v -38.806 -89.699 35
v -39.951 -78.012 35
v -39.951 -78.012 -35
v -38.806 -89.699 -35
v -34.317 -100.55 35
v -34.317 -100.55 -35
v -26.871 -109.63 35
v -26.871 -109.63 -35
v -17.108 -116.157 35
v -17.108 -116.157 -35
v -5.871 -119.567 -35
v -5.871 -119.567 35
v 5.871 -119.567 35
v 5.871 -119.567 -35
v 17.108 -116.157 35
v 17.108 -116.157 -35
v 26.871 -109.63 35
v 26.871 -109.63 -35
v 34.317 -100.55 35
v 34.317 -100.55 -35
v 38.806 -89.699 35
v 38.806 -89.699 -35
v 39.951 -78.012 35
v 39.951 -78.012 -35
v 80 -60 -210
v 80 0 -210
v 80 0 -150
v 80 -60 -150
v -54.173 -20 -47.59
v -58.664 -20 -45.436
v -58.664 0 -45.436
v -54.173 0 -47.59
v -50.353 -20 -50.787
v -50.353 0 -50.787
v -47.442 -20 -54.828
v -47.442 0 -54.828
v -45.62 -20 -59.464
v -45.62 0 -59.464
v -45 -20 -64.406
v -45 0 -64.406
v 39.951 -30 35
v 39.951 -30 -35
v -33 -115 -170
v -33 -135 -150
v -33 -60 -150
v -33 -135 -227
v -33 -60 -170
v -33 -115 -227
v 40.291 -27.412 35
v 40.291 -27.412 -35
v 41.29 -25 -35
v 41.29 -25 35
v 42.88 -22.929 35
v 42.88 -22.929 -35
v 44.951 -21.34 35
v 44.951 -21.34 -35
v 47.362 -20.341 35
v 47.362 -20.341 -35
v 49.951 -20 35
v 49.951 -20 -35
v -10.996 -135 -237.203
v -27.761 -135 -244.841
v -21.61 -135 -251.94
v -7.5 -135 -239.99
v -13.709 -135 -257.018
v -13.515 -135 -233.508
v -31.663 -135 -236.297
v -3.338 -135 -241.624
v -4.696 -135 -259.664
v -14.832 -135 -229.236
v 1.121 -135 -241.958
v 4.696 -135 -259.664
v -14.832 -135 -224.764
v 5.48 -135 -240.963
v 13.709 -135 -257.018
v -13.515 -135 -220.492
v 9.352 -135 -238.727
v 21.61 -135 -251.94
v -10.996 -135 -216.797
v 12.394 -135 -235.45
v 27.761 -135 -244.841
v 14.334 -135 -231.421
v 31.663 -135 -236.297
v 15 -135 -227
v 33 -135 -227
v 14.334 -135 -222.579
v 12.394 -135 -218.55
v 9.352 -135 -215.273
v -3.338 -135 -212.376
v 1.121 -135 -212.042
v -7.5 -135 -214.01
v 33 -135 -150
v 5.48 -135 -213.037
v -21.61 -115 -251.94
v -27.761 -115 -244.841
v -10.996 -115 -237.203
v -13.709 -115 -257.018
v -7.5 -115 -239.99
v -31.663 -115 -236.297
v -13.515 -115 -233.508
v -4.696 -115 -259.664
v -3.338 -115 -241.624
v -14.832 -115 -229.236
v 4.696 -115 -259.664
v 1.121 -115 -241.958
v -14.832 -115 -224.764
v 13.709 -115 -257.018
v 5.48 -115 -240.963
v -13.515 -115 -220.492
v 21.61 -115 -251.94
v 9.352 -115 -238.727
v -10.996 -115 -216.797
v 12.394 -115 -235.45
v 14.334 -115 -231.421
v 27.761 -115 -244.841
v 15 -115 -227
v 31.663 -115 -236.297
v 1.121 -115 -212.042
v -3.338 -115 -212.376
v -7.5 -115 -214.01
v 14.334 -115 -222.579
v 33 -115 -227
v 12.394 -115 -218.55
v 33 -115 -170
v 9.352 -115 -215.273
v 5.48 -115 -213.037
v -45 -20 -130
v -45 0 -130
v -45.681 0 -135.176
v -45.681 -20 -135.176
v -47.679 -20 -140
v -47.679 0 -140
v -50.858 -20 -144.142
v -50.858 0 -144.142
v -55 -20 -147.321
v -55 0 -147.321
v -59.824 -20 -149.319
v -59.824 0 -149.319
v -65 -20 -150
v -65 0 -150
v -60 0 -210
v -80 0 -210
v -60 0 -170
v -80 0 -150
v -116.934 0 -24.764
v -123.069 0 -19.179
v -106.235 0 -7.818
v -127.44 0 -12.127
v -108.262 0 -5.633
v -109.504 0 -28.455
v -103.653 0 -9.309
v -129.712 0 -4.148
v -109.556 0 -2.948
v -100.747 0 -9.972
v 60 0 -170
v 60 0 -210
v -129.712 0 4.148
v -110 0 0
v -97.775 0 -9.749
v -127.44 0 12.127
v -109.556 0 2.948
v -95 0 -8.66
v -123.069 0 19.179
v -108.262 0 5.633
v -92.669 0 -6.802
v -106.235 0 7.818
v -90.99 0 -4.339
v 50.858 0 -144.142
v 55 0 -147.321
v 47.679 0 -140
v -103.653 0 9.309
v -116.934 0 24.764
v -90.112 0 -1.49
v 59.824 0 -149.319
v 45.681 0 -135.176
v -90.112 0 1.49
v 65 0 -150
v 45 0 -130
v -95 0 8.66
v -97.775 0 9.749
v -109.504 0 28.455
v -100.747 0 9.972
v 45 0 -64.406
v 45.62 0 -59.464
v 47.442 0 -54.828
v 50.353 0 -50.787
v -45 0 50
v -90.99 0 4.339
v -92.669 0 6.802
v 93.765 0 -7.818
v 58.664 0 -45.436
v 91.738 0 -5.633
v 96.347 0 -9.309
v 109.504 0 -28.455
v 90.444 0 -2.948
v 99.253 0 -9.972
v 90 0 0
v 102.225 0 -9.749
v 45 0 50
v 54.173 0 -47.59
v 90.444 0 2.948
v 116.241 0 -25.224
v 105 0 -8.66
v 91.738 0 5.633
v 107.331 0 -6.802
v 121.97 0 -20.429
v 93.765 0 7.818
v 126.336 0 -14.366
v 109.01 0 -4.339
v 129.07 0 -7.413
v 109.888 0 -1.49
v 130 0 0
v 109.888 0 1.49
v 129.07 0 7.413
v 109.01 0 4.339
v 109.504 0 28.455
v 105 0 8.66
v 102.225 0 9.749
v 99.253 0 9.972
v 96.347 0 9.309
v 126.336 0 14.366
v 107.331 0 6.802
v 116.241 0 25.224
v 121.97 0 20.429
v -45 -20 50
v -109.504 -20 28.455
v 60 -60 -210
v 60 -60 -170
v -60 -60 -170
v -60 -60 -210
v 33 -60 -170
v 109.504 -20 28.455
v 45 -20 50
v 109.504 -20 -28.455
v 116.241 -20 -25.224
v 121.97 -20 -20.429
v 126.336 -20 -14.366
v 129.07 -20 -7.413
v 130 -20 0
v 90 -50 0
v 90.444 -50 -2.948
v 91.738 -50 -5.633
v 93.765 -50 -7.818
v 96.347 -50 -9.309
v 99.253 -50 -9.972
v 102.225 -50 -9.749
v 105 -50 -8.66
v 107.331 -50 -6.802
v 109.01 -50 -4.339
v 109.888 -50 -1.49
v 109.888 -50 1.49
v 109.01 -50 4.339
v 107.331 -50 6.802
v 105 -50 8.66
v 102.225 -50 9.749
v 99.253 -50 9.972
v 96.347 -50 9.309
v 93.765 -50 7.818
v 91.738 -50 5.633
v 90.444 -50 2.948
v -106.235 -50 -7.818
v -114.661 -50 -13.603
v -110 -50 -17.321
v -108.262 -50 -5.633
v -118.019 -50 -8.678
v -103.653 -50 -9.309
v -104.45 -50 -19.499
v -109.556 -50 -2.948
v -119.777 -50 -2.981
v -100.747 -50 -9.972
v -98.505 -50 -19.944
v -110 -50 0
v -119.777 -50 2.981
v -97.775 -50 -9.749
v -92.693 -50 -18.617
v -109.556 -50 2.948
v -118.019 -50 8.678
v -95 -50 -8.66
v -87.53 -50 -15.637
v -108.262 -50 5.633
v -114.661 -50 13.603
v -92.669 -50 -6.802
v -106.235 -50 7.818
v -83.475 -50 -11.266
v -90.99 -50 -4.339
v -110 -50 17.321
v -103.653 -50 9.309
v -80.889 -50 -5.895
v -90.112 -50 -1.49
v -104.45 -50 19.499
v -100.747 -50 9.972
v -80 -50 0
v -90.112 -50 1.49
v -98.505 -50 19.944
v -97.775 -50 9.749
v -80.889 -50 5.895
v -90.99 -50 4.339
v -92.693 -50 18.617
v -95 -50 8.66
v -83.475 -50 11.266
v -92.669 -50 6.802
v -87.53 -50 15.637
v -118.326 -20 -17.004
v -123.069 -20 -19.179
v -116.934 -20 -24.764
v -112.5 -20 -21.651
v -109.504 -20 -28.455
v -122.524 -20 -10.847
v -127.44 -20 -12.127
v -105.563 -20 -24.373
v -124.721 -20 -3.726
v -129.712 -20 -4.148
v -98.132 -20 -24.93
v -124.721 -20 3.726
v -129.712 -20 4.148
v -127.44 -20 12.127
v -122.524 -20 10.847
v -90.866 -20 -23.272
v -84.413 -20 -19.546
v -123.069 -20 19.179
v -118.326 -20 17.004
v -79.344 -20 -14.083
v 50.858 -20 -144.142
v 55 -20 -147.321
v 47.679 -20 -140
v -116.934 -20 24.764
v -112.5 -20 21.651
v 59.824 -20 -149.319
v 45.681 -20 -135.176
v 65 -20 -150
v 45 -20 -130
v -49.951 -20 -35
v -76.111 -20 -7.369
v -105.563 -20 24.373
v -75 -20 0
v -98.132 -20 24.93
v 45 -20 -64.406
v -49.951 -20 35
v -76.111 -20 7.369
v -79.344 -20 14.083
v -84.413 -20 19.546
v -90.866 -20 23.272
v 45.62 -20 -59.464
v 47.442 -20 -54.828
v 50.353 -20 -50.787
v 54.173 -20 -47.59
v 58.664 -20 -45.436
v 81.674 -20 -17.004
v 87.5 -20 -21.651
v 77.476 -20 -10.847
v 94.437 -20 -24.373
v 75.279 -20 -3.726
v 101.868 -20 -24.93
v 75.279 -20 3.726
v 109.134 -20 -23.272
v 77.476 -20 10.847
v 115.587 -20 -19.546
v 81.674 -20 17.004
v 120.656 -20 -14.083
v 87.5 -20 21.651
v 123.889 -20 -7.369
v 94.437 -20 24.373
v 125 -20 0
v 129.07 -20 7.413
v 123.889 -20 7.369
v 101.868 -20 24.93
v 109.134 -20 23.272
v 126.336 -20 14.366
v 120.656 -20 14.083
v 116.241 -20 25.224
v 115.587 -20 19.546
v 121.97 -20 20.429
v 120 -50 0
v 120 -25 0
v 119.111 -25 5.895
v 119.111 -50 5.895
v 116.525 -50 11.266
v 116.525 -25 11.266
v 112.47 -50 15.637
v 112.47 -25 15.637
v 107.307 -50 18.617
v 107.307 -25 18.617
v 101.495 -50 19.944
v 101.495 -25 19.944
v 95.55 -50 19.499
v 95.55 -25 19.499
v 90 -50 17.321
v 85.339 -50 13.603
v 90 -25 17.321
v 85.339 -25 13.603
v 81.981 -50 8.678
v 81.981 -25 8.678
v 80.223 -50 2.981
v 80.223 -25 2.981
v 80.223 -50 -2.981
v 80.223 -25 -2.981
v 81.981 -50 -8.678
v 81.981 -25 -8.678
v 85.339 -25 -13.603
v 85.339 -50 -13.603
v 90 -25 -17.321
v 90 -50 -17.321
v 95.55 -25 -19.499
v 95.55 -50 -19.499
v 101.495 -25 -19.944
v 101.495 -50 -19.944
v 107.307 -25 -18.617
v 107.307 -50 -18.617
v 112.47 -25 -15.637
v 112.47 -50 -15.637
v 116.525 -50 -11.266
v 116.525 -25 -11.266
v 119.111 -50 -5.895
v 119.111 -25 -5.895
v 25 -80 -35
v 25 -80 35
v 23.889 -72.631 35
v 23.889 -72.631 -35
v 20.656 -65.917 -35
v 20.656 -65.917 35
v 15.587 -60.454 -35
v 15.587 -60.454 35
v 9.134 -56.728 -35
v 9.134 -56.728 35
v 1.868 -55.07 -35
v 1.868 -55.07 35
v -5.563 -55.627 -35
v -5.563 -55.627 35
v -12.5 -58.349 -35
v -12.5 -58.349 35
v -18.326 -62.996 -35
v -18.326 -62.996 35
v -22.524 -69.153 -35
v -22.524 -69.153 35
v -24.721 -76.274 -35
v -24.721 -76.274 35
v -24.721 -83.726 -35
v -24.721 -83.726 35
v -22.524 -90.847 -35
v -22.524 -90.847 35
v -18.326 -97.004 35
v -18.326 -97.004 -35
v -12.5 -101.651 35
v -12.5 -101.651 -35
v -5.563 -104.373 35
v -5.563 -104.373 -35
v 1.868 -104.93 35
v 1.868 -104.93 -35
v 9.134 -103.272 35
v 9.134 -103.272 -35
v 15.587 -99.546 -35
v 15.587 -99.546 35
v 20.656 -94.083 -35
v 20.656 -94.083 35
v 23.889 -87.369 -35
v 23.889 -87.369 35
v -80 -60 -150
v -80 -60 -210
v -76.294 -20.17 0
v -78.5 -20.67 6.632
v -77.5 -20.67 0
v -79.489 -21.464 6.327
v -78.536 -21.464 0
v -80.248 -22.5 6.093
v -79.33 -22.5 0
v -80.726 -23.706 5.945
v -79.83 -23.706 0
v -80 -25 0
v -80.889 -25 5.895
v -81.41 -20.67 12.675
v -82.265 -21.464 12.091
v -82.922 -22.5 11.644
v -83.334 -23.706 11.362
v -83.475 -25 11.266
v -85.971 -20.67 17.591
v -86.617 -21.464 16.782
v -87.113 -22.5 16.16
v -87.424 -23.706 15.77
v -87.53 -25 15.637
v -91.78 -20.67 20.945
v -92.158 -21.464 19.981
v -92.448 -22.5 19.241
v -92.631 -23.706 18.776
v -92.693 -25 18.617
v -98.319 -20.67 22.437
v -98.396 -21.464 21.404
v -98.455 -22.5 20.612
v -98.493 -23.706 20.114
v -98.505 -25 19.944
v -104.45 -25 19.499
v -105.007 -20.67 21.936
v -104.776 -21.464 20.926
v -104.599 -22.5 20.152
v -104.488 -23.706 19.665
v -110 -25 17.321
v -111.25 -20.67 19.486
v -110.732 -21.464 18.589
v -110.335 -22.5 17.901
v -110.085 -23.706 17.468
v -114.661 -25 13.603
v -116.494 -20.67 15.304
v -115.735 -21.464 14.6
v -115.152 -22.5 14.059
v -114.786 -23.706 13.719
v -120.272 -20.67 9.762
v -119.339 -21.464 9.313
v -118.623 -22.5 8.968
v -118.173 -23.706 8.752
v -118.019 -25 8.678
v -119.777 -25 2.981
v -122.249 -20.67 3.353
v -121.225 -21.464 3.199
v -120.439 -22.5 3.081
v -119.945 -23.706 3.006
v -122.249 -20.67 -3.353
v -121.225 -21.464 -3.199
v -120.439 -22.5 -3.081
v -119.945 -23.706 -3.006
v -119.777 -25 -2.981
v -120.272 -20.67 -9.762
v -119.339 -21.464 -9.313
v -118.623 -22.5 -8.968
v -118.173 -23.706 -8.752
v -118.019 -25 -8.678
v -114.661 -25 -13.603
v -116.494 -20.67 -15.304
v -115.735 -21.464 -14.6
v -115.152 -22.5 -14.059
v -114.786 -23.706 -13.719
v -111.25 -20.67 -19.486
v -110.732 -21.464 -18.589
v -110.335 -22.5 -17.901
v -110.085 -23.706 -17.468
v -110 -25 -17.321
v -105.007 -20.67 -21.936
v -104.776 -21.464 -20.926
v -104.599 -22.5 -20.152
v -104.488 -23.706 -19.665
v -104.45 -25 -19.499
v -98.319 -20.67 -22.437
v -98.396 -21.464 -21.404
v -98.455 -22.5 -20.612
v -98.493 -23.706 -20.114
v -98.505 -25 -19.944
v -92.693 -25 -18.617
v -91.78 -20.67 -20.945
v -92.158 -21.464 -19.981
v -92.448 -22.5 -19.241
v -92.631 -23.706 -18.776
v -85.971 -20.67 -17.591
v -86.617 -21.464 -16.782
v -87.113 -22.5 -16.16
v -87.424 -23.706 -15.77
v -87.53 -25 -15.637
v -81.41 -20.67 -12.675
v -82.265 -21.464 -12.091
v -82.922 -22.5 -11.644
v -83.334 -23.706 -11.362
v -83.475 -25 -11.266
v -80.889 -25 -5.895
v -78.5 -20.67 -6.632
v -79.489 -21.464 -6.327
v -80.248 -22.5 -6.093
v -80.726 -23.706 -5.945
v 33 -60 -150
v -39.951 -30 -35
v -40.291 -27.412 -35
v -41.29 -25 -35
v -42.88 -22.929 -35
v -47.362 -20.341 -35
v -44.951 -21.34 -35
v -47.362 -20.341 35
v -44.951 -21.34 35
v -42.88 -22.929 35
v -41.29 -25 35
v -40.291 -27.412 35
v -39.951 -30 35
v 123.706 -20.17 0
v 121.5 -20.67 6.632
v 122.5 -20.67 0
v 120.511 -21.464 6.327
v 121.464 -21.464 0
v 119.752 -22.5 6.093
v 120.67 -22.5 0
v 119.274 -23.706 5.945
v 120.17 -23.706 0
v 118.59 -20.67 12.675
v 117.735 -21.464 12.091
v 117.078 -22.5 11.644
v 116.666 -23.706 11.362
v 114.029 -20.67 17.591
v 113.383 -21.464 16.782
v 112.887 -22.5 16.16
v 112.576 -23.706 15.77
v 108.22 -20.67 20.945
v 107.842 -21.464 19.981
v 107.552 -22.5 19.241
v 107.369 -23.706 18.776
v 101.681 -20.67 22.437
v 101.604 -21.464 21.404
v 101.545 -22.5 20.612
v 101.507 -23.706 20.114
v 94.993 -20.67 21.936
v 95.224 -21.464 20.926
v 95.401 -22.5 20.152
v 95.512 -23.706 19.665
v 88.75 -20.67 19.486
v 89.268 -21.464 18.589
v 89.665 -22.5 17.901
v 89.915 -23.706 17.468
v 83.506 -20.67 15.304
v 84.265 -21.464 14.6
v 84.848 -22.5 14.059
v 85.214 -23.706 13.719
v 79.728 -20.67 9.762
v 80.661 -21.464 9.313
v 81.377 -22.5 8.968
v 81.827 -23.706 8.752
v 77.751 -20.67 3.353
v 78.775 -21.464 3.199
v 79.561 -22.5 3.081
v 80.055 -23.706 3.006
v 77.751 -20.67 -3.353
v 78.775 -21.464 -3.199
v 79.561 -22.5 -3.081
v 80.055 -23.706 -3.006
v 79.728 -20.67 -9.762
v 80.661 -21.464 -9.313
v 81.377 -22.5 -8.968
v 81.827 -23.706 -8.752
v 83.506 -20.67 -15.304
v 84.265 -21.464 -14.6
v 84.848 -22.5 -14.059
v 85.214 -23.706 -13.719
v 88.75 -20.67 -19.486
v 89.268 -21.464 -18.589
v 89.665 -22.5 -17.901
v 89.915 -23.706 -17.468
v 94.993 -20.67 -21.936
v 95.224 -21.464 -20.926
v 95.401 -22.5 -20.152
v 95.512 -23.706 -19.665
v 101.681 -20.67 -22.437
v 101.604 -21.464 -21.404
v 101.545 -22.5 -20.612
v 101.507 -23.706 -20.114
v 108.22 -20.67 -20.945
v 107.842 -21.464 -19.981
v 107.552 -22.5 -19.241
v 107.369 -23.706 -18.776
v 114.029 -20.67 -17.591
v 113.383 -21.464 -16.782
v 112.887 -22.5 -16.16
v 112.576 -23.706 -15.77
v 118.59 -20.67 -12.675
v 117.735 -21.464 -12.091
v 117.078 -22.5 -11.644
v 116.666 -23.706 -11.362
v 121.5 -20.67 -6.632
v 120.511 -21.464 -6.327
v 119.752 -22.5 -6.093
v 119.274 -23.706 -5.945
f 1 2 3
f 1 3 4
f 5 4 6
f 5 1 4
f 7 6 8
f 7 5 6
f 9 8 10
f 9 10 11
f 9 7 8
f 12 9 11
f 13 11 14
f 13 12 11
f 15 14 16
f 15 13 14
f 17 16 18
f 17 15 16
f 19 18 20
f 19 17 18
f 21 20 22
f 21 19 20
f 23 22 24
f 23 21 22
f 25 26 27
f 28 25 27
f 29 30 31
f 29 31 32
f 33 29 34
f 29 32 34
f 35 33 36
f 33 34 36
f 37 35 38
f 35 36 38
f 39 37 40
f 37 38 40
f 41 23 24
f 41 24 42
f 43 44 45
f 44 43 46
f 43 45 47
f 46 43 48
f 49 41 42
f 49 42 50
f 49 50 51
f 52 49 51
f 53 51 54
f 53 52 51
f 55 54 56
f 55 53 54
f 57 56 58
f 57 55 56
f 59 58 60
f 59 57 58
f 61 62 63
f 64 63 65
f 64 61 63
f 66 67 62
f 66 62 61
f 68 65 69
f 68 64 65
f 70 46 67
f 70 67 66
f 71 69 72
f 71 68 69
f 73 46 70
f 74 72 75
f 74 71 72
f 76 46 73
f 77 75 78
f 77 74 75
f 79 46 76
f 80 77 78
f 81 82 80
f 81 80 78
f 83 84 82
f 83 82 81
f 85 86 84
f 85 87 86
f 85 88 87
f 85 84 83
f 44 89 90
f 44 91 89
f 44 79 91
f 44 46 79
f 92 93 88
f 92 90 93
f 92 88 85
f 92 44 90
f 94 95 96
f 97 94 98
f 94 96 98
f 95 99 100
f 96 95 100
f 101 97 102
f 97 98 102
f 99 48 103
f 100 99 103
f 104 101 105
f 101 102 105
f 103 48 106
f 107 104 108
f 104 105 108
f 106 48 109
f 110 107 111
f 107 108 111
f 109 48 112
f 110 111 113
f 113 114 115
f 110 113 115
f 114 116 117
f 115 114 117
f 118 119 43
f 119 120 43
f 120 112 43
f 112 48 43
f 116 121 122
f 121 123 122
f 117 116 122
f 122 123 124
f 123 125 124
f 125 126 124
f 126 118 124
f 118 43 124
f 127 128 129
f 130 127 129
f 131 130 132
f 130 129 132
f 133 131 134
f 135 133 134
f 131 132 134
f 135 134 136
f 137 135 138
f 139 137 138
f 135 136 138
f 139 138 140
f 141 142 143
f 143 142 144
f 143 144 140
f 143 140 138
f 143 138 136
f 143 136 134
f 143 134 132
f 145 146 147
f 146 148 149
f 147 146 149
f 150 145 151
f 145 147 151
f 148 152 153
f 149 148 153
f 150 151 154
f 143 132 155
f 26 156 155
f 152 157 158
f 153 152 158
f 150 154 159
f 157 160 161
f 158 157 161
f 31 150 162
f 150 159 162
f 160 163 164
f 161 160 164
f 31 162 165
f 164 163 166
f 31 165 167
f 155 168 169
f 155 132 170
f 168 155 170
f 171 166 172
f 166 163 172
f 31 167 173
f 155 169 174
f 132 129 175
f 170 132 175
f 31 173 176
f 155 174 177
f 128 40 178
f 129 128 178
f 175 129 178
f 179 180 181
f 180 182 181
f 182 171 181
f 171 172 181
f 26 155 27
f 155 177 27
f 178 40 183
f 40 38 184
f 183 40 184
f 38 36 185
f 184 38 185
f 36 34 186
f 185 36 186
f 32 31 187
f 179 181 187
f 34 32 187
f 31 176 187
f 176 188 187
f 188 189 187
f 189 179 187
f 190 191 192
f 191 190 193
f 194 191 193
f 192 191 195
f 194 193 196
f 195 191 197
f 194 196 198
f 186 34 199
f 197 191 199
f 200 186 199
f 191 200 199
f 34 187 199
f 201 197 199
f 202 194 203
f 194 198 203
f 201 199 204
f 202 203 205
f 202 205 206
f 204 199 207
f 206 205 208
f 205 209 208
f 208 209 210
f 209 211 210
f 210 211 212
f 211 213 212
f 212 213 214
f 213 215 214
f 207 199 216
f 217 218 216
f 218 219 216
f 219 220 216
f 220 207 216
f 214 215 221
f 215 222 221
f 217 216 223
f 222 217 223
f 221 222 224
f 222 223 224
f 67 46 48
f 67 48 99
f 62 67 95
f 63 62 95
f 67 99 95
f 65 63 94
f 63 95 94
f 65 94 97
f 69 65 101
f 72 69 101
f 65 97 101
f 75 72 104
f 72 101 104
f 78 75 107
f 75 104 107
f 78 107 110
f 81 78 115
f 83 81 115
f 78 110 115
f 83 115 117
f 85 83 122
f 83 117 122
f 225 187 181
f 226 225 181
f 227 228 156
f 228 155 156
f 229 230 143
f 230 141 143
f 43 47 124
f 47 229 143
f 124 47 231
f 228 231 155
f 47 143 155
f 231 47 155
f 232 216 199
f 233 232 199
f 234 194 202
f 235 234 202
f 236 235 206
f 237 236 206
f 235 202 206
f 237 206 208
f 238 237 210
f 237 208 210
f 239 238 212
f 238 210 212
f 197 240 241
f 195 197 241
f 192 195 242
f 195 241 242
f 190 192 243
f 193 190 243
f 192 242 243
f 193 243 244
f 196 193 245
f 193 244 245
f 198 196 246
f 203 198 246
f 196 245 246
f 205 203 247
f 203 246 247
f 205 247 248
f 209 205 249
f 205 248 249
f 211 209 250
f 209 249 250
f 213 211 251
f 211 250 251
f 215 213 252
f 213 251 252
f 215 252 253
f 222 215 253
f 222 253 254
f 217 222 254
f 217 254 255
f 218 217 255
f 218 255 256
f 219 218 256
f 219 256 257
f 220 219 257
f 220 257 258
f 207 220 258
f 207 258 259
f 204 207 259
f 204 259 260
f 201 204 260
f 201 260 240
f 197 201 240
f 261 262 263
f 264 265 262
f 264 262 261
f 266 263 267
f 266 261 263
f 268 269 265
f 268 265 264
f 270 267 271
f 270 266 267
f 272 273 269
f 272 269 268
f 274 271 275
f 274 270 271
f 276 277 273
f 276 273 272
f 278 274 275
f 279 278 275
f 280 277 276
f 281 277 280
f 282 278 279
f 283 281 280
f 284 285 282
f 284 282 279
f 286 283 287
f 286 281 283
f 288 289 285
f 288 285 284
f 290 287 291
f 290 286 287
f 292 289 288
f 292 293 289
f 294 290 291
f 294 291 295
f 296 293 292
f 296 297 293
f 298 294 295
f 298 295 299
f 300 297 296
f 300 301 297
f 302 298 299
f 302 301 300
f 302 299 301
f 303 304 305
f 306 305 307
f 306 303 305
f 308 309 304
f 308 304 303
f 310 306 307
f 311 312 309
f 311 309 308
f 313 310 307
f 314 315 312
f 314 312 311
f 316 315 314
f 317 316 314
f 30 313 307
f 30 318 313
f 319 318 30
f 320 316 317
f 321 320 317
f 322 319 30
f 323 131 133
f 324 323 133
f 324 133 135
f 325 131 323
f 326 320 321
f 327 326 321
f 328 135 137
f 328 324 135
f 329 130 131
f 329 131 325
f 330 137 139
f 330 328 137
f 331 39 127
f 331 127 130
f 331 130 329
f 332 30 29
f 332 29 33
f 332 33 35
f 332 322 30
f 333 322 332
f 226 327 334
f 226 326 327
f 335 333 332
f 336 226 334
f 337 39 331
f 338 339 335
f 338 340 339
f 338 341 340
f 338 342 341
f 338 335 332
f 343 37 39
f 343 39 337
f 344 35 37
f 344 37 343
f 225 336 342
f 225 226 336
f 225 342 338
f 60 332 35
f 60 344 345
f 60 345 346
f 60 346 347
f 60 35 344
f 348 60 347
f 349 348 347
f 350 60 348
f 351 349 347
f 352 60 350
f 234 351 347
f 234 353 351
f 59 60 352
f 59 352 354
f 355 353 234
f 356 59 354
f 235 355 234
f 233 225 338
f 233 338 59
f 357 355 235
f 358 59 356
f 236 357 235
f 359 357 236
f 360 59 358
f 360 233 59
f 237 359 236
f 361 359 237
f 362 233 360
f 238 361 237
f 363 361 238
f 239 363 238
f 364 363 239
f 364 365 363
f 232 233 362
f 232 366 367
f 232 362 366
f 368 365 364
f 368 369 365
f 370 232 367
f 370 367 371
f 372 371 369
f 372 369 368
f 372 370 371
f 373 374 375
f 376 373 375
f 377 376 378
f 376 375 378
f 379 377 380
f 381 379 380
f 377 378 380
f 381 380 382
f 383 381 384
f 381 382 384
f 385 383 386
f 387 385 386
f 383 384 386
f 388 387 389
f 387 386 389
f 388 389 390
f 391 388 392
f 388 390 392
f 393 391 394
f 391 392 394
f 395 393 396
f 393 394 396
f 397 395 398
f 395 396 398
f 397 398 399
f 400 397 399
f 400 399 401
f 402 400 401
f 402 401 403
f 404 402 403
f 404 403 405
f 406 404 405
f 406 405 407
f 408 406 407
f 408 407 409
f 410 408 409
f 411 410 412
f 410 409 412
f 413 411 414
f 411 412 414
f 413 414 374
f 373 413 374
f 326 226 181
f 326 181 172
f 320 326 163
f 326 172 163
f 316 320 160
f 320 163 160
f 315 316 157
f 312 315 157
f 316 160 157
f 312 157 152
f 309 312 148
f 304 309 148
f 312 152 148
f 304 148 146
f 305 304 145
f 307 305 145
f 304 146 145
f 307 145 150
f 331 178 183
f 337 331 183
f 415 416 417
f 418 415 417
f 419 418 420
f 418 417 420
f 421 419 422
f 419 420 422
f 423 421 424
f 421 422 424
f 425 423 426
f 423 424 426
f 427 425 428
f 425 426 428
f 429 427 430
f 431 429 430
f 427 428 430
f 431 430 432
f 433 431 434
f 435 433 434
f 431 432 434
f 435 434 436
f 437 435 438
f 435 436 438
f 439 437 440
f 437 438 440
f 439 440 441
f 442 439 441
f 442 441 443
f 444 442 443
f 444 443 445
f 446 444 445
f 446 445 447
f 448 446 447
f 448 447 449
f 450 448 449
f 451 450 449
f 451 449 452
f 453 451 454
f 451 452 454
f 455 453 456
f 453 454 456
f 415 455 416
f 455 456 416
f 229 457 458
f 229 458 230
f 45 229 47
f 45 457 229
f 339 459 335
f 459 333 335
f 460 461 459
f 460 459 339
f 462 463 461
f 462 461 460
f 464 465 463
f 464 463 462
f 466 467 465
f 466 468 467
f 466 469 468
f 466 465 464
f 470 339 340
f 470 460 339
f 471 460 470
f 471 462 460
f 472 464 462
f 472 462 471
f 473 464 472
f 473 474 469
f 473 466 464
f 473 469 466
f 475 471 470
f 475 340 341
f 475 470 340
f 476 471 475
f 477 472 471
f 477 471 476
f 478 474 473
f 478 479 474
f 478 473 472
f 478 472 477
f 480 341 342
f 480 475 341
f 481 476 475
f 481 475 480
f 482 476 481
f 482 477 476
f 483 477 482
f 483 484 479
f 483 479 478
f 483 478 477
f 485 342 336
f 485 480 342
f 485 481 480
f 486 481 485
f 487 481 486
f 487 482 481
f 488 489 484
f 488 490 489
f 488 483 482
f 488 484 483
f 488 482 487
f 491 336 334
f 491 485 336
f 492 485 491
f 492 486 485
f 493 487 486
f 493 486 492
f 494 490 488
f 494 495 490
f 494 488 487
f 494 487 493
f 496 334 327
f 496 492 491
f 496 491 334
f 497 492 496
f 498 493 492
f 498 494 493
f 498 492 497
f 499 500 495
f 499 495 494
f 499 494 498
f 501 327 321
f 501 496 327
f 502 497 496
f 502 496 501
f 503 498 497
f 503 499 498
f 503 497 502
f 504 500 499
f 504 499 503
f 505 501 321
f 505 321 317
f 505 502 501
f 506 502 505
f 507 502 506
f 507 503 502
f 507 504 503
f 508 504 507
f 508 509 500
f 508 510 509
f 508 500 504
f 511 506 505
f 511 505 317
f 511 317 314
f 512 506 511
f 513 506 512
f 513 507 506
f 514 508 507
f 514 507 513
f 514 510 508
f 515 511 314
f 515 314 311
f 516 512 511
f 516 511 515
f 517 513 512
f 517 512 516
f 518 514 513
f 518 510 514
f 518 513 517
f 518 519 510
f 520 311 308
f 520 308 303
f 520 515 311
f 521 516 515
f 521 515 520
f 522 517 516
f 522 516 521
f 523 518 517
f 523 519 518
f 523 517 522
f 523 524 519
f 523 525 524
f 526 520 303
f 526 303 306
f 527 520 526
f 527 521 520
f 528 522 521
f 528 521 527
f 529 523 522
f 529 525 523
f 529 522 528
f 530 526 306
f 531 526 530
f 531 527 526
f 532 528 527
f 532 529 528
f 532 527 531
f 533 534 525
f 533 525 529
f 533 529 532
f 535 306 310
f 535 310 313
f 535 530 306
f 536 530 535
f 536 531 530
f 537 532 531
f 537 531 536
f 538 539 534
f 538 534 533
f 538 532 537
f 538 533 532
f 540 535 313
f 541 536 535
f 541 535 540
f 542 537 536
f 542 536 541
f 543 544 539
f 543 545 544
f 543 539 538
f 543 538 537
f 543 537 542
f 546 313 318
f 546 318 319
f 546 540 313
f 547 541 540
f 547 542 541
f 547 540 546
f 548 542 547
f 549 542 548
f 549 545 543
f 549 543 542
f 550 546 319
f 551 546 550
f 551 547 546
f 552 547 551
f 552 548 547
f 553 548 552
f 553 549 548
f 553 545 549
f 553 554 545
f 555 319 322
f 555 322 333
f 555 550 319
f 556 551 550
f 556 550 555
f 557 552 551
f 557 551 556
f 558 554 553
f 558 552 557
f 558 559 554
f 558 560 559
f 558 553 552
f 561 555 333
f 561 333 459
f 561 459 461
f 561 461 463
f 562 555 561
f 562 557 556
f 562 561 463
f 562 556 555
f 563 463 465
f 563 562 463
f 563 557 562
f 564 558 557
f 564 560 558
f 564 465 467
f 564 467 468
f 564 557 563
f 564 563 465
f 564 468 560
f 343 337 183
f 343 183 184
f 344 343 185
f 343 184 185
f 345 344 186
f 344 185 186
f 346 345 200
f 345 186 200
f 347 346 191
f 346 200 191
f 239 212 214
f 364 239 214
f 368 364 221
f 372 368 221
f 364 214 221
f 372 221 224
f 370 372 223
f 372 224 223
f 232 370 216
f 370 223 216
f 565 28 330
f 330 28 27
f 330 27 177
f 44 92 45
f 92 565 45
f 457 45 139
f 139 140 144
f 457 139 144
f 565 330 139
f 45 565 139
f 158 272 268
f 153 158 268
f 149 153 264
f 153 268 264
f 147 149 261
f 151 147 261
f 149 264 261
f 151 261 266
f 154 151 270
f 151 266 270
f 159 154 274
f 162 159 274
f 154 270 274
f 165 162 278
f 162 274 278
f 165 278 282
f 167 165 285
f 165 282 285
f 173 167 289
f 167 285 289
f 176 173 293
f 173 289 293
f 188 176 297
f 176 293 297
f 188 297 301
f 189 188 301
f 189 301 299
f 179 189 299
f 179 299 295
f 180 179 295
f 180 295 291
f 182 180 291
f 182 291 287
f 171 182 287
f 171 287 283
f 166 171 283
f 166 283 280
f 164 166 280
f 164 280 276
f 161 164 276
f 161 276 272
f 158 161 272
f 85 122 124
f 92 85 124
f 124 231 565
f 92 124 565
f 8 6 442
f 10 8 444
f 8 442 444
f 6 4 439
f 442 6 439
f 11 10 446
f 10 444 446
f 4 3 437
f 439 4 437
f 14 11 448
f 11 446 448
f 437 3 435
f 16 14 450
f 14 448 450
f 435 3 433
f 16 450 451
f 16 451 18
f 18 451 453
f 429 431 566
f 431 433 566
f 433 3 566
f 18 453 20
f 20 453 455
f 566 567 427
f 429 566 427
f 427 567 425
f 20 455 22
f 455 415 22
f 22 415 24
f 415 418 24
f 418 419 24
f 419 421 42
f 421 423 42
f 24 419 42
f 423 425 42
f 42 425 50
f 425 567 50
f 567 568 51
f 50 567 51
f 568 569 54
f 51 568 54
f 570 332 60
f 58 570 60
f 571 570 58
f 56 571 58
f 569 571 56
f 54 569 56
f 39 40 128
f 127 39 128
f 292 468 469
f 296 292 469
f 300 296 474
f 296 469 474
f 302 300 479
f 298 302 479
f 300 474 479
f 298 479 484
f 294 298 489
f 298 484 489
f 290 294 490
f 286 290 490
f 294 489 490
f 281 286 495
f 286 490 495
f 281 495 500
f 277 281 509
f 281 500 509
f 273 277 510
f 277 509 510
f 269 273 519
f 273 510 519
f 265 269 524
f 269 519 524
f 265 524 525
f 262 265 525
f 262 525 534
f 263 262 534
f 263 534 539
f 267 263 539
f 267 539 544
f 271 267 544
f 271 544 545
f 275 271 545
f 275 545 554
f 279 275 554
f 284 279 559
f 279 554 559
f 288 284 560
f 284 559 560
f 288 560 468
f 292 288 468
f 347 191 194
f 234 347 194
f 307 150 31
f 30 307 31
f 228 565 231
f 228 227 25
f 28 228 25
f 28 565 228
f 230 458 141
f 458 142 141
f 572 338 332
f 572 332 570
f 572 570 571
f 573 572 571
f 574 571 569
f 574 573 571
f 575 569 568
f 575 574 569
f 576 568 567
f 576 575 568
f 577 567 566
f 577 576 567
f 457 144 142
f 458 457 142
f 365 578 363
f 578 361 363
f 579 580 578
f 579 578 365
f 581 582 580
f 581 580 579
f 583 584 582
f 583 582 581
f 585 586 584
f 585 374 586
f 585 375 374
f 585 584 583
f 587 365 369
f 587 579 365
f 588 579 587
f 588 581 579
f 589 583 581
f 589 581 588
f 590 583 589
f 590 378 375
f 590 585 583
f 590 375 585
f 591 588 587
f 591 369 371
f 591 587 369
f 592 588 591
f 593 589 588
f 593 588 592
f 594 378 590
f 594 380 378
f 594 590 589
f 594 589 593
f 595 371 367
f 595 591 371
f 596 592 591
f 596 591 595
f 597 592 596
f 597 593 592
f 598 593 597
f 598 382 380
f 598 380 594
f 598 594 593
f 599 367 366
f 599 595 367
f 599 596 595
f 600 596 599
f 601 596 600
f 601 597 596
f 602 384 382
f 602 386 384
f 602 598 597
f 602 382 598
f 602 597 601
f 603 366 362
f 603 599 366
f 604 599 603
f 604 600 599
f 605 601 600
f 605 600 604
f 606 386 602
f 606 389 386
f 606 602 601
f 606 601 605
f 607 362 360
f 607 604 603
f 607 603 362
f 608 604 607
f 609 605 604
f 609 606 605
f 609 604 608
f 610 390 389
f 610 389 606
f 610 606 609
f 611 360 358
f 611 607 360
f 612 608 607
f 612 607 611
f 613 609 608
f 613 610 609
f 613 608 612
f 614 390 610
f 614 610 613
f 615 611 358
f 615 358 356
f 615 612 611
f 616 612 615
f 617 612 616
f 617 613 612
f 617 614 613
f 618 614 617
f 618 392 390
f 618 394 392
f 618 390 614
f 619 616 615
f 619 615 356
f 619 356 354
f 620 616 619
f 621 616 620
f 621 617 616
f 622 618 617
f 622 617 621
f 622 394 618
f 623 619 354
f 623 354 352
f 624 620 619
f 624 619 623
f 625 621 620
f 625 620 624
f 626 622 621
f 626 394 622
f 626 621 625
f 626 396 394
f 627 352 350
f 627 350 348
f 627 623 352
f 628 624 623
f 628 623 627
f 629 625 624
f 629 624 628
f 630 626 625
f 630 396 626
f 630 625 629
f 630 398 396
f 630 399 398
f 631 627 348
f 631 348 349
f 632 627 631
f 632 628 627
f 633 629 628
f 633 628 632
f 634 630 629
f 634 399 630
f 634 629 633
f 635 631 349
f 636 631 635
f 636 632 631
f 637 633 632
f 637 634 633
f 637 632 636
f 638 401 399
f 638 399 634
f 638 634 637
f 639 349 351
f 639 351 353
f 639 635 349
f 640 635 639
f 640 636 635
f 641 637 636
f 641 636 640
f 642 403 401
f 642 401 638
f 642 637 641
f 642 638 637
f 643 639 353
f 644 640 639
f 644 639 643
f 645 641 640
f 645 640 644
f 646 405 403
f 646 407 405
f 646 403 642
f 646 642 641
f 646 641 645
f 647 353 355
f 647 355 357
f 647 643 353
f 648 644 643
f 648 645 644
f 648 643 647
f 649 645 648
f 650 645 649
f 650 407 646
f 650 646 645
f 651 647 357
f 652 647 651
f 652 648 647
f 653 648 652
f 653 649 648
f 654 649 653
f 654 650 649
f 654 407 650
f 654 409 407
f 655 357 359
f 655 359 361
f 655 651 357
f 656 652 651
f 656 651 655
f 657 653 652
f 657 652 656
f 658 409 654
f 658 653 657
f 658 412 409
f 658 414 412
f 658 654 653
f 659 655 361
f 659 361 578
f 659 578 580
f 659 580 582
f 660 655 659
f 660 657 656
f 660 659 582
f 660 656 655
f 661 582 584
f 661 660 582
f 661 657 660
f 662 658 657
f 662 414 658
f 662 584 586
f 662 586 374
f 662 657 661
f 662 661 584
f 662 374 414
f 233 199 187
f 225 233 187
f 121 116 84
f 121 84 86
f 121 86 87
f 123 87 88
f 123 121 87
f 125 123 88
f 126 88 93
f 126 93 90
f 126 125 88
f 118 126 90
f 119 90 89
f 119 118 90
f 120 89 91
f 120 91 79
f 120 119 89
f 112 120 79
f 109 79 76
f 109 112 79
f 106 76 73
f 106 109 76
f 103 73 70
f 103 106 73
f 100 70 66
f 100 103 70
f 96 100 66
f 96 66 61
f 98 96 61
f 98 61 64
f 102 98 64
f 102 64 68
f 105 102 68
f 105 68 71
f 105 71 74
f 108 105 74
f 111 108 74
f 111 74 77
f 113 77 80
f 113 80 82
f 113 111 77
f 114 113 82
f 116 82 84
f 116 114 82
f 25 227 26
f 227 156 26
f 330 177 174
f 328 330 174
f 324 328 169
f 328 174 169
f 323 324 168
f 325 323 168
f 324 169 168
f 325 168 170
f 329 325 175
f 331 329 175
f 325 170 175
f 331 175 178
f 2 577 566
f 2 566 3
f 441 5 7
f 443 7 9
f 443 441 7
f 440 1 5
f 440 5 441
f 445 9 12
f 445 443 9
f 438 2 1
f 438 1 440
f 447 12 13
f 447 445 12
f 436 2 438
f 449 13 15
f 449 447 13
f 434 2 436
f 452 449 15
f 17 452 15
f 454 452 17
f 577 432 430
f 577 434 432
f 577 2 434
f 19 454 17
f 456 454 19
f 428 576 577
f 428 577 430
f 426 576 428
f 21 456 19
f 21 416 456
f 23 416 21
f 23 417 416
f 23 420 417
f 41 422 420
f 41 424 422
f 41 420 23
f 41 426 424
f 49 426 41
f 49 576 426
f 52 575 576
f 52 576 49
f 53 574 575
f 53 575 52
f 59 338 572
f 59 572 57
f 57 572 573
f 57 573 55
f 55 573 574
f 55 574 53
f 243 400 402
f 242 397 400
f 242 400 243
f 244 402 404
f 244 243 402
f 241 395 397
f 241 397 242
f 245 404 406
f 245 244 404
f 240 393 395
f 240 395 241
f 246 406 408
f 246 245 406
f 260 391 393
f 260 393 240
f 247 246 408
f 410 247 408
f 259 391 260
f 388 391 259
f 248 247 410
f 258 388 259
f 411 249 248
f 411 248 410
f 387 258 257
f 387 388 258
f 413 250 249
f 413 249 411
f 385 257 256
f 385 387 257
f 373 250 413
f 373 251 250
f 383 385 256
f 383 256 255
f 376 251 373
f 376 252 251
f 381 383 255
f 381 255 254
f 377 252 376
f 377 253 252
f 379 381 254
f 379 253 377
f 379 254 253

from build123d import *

# Parameters (mm, degrees)
F1_DEPTH  = 20
F2_R      = 20
F3_DEPTH  = 30
F4_DEPTH  = 40
F5_W      = 33
F5_H      = 20
F6_DEPTH  = 55
F7_R      = 15
F8_DEPTH  = 20
F9_D      = 20
F11_R     = 25
F12_DEPTH = 70
F13_R     = 5


with BuildPart() as f1:
    # F0 (on Front) → F1 (new body)
    with BuildSketch(Plane.XZ):
        with BuildLine():
            ThreePointArc((-109.5042586091, -28.4546844701), (-82.4661435827, -24.3426350081), (-70, 0))
            ThreePointArc((-70, 0), (-82.4661435827, 24.3426350081), (-109.5042586091, 28.4546844701))
            ThreePointArc((-109.5042586091, 28.4546844701), (-130, 0), (-109.5042586091, -28.4546844701))
        make_face()
        with BuildLine():
            ThreePointArc((-109.5042586091, 28.4546844701), (-82.4661435827, 24.3426350081), (-70, 0))
            ThreePointArc((-70, 0), (-82.4661435827, -24.3426350081), (-109.5042586091, -28.4546844701))
            Line((-109.5042586091, -28.4546844701), (-58.6638275939, -45.4360923882))
            ThreePointArc((-58.6638275939, -45.4360923882), (-48.7715766613, -52.7166444234), (-45, -64.4058820349))
            Line((-45, -64.4058820349), (-45, -130))
            ThreePointArc((-45, -130), (-50.8578643763, -144.1421356237), (-65, -150))
            Line((-65, -150), (-80, -150))
            Line((-80, -150), (-80, -210))
            Line((-80, -210), (-60, -210))
            Line((-60, -210), (-60, -170))
            Line((-60, -170), (60, -170))
            Line((60, -170), (60, -210))
            Line((60, -210), (80, -210))
            Line((80, -210), (80, -150))
            Line((80, -150), (65, -150))
            ThreePointArc((65, -150), (50.8578643763, -144.1421356237), (45, -130))
            Line((45, -130), (45, -64.4058820349))
            ThreePointArc((45, -64.4058820349), (48.7715766613, -52.7166444234), (58.6638275939, -45.4360923882))
            Line((58.6638275939, -45.4360923882), (109.5042586091, -28.4546844701))
            ThreePointArc((109.5042586091, -28.4546844701), (70, 0), (109.5042586091, 28.4546844701))
            Line((109.5042586091, 28.4546844701), (45, 50))
            Line((45, 50), (0, 50))
            Line((0, 50), (-45, 50))
            Line((-45, 50), (-109.5042586091, 28.4546844701))
        make_face()
        with BuildLine():
            ThreePointArc((130, 0), (124.3426350081, 17.5338564173), (109.5042586091, 28.4546844701))
            ThreePointArc((109.5042586091, 28.4546844701), (70, 0), (109.5042586091, -28.4546844701))
            ThreePointArc((109.5042586091, -28.4546844701), (124.3426350081, -17.5338564173), (130, 0))
        make_face()
    extrude(amount=F1_DEPTH)

    # F2 (on face) → F3 (join)
    with BuildSketch(Plane.XZ.offset(20)):
        with Locations((100, 0)):
            Circle(F2_R)
        with Locations((-100, 0)):
            Circle(F2_R)
    extrude(amount=F3_DEPTH)

    # F2 (on face) → F4 (join)
    with BuildSketch(Plane.XZ.offset(20)):
        Polygon((-65, -150), (-80, -150), (-80, -210), (-60, -210), (-60, -170), (60, -170), (60, -210), (80, -210), (80, -150), (65, -150), align=None)
    extrude(amount=F4_DEPTH)

    # F5 (on face) → F6 (join)
    with BuildSketch(Plane.XZ.offset(60)):
        with Locations((16.5, -160)):
            Rectangle(F5_W, F5_H)
        with Locations((-16.5, -160)):
            Rectangle(F5_W, F5_H)
    extrude(amount=F6_DEPTH)

    # F7 (on face) → F8 (join)
    with BuildSketch(Plane.XZ.offset(115)):
        with BuildLine():
            ThreePointArc((-33, -227), (0, -260), (33, -227))
            ThreePointArc((33, -227), (0, -194), (-33, -227))
        make_face()
        with Locations((0, -227)):
            Circle(F7_R, mode=Mode.SUBTRACT)
        with BuildLine():
            ThreePointArc((-33, -227), (0, -194), (33, -227))
            Line((33, -227), (33, -170))
            Line((33, -170), (33, -150))
            Line((33, -150), (-33, -150))
            Line((-33, -150), (-33, -170))
            Line((-33, -170), (-33, -227))
        make_face()
    extrude(amount=F8_DEPTH)

    # F9 (through all)
    with Locations(Plane(origin=(0, 0, 0), x_dir=(1, 0, 0), z_dir=(0, 1, 0))):
        with Locations((100, 0), (-100, 0)):
            Hole(F9_D / 2)

    # F11 (on offset) → F12 (join)
    with BuildSketch(Plane.XY.offset(35)):
        with BuildLine():
            ThreePointArc((-39.9505821476, -78.0122912513), (-0.9941614801, -119.9876436284), (40, -80))
            ThreePointArc((40, -80), (39.9876436284, -79.0058385199), (39.9505821476, -78.0122912513))
            ThreePointArc((39.9505821476, -78.0122912513), (0, -40), (-39.9505821476, -78.0122912513))
        make_face()
        with Locations((0, -80)):
            Circle(F11_R, mode=Mode.SUBTRACT)
        with BuildLine():
            ThreePointArc((-39.9505821476, -78.0122912513), (0, -40), (39.9505821476, -78.0122912513))
            Line((39.9505821476, -78.0122912513), (39.9505821476, -30))
            ThreePointArc((39.9505821476, -30), (42.8795143357, -22.9289321881), (49.9505821476, -20))
            Line((49.9505821476, -20), (-49.9505821476, -20))
            ThreePointArc((-49.9505821476, -20), (-42.8795143357, -22.9289321881), (-39.9505821476, -30))
            Line((-39.9505821476, -30), (-39.9505821476, -78.0122912513))
        make_face()
    extrude(amount=-F12_DEPTH)

    # F13
    f13_edges = [f1.edges().sort_by_distance(p)[0] for p in [
        (-120, -20, 0),
        (80, -20, 0),
    ]]
    fillet(f13_edges, radius=F13_R)


solid = f1.part
